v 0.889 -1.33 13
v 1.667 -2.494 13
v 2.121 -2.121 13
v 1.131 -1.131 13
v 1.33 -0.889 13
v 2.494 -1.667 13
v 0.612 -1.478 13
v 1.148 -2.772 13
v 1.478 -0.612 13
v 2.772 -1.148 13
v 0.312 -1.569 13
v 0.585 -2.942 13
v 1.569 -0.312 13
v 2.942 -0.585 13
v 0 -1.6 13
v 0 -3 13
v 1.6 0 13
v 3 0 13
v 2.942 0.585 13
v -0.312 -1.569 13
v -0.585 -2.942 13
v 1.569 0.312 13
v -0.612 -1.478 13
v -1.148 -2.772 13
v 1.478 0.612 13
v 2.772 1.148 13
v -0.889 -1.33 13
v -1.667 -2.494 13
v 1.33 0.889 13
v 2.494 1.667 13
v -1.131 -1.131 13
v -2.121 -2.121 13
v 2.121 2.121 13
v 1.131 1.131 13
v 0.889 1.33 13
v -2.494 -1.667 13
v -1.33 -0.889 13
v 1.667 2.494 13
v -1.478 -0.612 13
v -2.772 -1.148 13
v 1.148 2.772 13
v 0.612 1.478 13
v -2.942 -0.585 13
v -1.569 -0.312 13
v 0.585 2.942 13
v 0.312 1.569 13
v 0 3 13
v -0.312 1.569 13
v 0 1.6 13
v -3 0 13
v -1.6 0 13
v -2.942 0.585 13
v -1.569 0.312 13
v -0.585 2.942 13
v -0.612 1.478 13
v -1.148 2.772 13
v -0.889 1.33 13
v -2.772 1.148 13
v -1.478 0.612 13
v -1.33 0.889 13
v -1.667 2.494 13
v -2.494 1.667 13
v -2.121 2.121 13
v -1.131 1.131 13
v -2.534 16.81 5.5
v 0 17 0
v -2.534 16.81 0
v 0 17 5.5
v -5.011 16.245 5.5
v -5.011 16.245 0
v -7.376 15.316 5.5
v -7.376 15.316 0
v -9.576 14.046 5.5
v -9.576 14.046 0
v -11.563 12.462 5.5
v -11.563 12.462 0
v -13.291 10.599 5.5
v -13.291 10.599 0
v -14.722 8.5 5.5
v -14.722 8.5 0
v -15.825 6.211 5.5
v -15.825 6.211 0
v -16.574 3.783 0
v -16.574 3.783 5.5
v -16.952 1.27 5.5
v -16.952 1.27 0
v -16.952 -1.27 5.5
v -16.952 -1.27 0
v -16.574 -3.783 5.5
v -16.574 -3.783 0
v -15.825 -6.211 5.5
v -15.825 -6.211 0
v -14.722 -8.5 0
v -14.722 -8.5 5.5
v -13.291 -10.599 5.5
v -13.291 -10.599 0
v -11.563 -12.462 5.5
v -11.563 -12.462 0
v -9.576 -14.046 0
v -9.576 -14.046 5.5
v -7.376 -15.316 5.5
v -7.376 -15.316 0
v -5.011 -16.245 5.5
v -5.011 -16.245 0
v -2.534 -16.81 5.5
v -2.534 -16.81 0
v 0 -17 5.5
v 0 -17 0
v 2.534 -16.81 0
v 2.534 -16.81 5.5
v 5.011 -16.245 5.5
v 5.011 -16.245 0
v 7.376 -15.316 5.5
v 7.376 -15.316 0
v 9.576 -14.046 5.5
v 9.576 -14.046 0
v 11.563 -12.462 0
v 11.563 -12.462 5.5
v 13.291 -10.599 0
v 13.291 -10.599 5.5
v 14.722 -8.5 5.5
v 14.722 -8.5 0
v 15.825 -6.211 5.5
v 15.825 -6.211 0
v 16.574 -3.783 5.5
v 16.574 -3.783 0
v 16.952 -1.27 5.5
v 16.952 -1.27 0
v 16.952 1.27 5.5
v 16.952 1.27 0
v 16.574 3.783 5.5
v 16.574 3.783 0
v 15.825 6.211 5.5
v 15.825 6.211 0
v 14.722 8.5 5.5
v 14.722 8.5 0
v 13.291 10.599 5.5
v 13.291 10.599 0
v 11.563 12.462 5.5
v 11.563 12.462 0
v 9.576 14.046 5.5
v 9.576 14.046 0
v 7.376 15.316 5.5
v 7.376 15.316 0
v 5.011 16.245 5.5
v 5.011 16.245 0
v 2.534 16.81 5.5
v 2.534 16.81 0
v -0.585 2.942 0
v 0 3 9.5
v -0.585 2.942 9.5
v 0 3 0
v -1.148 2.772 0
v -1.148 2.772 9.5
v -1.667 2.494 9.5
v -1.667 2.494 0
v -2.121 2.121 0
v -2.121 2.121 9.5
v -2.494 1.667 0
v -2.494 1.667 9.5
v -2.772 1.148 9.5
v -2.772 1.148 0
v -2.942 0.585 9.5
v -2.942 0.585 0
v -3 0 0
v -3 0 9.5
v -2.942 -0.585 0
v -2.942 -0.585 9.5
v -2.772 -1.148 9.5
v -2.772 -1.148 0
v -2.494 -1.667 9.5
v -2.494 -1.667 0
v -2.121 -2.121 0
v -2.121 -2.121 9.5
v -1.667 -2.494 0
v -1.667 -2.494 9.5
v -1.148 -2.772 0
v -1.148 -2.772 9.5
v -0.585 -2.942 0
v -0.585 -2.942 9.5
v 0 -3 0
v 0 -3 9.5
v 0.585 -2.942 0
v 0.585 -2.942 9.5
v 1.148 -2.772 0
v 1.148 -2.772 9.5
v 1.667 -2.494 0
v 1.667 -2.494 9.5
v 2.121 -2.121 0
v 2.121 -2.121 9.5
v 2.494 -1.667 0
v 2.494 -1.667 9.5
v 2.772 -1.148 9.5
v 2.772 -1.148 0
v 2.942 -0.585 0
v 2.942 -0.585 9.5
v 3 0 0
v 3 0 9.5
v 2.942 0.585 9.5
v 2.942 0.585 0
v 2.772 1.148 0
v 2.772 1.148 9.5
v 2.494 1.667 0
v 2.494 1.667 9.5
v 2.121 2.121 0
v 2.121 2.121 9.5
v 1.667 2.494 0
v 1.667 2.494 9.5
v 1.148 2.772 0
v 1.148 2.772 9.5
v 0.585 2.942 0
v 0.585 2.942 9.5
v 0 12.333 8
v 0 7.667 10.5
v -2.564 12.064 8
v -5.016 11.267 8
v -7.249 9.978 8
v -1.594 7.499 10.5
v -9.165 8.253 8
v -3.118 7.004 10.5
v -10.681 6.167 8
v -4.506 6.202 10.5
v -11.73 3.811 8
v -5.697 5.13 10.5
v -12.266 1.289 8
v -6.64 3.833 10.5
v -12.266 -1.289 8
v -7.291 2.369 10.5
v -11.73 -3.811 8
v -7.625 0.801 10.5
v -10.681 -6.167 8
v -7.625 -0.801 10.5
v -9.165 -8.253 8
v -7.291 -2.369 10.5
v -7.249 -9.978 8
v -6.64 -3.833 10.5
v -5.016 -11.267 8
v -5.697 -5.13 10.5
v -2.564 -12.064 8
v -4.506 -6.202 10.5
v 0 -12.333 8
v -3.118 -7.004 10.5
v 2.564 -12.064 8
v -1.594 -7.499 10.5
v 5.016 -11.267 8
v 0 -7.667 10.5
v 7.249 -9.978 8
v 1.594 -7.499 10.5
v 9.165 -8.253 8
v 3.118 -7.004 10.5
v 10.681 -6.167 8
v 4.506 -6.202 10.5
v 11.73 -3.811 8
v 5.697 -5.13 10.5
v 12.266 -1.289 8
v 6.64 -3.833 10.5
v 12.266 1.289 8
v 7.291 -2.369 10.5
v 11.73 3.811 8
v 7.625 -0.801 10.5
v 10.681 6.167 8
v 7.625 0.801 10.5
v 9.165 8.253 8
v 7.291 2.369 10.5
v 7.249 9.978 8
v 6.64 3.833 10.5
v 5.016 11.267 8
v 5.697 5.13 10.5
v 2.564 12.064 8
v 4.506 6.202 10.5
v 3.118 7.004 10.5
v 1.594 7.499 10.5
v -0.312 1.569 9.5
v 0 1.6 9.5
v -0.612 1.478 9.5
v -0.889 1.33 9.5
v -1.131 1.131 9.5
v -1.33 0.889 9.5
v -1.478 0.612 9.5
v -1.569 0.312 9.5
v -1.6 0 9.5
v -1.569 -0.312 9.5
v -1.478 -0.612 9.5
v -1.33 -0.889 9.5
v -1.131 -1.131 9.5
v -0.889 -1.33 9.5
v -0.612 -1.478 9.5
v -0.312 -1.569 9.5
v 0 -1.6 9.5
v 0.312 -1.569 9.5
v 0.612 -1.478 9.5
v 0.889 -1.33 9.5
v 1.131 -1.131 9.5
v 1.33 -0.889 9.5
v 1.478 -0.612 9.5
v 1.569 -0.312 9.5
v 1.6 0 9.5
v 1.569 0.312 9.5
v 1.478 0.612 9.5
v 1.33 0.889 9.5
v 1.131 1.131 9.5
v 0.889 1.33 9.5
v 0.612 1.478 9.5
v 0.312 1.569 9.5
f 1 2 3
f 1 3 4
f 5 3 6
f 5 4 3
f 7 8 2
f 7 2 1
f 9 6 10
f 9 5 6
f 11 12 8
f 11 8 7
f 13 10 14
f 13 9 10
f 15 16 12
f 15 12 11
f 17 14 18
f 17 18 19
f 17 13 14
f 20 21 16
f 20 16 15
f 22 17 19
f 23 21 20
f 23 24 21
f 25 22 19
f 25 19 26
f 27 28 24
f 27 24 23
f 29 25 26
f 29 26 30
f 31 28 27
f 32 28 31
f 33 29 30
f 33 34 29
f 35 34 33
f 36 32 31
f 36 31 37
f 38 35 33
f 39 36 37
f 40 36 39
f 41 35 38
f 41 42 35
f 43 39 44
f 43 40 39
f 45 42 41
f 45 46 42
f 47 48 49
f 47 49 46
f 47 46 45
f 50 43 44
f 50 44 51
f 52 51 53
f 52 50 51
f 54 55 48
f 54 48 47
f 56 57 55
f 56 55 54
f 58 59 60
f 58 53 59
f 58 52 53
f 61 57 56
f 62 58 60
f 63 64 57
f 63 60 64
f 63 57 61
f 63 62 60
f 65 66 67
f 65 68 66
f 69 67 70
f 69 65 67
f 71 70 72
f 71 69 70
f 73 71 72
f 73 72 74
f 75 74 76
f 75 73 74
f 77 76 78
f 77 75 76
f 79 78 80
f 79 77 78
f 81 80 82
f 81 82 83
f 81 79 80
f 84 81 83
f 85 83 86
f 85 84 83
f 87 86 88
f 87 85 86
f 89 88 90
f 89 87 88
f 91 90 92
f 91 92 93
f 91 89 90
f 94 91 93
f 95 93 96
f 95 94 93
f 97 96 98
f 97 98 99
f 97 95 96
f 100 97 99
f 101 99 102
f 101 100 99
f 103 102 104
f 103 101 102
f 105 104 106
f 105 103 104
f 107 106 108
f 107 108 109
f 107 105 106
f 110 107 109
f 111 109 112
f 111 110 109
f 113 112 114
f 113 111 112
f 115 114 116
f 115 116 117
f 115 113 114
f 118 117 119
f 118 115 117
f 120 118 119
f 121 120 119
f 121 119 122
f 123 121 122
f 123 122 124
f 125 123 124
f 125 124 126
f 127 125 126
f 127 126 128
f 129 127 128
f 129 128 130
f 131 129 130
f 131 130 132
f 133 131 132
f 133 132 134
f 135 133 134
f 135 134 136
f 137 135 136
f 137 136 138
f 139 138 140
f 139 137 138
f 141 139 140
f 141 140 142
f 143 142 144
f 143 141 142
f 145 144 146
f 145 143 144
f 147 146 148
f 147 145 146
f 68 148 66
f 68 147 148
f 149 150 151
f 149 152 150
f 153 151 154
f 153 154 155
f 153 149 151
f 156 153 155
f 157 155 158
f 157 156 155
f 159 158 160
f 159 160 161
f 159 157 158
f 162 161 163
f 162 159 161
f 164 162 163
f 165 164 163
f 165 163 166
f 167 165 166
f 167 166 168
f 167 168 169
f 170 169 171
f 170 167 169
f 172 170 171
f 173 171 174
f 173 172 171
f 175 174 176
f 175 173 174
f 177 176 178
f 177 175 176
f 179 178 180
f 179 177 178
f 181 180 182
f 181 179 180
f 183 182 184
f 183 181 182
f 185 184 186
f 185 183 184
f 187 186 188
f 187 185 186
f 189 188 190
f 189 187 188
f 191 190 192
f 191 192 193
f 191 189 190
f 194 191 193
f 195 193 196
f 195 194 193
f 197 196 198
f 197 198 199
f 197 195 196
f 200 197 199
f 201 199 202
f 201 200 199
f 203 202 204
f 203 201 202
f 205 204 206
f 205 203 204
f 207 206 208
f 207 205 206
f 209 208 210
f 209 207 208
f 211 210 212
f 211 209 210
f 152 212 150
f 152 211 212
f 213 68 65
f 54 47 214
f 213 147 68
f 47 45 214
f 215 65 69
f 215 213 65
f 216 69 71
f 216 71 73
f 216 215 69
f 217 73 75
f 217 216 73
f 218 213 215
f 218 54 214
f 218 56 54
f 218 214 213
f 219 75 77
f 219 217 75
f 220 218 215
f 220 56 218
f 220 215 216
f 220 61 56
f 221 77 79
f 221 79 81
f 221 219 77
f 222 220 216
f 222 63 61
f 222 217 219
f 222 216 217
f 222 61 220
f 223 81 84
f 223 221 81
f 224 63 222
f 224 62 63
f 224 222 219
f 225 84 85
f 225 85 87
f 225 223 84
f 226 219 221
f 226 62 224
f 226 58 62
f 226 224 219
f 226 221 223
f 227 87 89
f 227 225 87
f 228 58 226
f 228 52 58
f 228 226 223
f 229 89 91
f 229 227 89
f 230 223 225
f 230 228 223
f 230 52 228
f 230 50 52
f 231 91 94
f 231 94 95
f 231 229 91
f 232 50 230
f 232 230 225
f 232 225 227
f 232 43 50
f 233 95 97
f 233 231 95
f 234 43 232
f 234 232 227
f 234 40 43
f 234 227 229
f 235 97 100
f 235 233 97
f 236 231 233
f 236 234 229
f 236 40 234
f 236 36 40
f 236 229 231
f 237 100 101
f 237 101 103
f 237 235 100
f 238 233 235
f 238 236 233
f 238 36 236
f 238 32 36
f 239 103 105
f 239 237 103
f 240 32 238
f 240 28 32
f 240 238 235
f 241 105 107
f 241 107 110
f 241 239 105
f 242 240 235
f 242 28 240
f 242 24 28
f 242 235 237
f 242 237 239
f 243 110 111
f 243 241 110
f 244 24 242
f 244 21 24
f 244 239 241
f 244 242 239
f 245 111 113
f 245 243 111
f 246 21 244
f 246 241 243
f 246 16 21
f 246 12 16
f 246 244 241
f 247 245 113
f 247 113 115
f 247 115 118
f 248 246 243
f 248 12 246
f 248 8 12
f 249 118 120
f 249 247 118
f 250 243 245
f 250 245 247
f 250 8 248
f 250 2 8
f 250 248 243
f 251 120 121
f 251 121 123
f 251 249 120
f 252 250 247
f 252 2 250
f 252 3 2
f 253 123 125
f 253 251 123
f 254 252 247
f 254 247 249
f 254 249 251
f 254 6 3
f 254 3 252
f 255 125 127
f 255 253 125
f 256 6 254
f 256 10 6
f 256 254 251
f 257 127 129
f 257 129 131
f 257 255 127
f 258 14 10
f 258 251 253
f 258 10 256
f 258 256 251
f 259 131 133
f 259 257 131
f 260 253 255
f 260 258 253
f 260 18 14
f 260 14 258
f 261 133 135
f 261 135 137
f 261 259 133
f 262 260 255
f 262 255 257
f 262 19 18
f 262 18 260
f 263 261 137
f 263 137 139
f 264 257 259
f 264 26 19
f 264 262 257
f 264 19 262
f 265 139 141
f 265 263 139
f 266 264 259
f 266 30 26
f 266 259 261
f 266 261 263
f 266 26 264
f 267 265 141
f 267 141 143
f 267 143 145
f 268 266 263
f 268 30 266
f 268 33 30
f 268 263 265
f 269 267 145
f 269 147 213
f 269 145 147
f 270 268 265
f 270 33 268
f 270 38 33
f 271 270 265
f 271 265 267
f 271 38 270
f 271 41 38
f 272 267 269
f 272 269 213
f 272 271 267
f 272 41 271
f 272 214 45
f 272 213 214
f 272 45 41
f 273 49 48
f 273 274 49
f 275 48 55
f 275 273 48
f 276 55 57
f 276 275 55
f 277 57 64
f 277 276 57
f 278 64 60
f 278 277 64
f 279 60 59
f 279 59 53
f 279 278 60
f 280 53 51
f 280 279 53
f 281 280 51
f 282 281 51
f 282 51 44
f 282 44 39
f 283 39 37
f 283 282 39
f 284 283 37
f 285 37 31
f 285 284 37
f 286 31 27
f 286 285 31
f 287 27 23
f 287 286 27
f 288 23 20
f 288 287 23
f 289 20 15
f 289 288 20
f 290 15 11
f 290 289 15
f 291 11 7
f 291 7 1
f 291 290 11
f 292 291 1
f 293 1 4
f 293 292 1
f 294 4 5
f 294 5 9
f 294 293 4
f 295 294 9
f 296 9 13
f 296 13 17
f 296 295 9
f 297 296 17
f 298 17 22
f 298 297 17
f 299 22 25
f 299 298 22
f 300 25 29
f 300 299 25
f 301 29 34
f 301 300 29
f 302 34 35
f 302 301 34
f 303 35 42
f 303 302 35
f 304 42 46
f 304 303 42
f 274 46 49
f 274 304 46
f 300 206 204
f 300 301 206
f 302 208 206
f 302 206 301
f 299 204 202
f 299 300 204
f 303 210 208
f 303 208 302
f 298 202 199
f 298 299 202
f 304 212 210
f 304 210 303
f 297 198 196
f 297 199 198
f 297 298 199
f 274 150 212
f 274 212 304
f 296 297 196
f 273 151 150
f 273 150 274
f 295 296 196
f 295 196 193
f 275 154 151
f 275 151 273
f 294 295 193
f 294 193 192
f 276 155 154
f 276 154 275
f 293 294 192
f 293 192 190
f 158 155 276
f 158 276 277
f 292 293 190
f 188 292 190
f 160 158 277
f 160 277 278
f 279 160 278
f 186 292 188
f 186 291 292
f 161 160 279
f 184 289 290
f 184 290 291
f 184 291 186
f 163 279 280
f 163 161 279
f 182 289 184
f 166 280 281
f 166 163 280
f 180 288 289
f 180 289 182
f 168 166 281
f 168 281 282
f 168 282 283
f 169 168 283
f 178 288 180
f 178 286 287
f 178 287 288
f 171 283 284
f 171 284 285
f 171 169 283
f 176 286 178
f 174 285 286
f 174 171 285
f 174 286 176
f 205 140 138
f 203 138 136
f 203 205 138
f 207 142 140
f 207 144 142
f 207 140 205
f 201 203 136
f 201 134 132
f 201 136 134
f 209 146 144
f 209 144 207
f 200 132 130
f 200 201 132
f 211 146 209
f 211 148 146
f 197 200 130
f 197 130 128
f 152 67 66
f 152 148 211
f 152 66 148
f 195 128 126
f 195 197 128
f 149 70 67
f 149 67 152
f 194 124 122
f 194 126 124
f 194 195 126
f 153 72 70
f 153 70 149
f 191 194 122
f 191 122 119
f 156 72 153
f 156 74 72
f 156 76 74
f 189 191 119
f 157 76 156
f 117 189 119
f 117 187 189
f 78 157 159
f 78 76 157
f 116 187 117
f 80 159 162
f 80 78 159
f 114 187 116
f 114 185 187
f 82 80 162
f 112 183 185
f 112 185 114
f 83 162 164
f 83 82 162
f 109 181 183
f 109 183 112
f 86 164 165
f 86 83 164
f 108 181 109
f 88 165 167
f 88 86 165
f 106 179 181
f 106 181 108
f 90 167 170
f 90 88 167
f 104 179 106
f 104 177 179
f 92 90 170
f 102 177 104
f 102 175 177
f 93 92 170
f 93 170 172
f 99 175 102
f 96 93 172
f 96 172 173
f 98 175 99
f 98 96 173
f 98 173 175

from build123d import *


with BuildPart() as part:
    # Sketch002 → Revolution (revolve)
    with BuildSketch(Plane.YZ):
        Polygon((1.6, 13), (1.6, 9.5), (3, 9.5), (3, 0), (17, 0), (17, 5.5), (3, 13), align=None)
    revolve(axis=Axis((0, 0, 0), (0, 0, 1)))


solid = part.part
